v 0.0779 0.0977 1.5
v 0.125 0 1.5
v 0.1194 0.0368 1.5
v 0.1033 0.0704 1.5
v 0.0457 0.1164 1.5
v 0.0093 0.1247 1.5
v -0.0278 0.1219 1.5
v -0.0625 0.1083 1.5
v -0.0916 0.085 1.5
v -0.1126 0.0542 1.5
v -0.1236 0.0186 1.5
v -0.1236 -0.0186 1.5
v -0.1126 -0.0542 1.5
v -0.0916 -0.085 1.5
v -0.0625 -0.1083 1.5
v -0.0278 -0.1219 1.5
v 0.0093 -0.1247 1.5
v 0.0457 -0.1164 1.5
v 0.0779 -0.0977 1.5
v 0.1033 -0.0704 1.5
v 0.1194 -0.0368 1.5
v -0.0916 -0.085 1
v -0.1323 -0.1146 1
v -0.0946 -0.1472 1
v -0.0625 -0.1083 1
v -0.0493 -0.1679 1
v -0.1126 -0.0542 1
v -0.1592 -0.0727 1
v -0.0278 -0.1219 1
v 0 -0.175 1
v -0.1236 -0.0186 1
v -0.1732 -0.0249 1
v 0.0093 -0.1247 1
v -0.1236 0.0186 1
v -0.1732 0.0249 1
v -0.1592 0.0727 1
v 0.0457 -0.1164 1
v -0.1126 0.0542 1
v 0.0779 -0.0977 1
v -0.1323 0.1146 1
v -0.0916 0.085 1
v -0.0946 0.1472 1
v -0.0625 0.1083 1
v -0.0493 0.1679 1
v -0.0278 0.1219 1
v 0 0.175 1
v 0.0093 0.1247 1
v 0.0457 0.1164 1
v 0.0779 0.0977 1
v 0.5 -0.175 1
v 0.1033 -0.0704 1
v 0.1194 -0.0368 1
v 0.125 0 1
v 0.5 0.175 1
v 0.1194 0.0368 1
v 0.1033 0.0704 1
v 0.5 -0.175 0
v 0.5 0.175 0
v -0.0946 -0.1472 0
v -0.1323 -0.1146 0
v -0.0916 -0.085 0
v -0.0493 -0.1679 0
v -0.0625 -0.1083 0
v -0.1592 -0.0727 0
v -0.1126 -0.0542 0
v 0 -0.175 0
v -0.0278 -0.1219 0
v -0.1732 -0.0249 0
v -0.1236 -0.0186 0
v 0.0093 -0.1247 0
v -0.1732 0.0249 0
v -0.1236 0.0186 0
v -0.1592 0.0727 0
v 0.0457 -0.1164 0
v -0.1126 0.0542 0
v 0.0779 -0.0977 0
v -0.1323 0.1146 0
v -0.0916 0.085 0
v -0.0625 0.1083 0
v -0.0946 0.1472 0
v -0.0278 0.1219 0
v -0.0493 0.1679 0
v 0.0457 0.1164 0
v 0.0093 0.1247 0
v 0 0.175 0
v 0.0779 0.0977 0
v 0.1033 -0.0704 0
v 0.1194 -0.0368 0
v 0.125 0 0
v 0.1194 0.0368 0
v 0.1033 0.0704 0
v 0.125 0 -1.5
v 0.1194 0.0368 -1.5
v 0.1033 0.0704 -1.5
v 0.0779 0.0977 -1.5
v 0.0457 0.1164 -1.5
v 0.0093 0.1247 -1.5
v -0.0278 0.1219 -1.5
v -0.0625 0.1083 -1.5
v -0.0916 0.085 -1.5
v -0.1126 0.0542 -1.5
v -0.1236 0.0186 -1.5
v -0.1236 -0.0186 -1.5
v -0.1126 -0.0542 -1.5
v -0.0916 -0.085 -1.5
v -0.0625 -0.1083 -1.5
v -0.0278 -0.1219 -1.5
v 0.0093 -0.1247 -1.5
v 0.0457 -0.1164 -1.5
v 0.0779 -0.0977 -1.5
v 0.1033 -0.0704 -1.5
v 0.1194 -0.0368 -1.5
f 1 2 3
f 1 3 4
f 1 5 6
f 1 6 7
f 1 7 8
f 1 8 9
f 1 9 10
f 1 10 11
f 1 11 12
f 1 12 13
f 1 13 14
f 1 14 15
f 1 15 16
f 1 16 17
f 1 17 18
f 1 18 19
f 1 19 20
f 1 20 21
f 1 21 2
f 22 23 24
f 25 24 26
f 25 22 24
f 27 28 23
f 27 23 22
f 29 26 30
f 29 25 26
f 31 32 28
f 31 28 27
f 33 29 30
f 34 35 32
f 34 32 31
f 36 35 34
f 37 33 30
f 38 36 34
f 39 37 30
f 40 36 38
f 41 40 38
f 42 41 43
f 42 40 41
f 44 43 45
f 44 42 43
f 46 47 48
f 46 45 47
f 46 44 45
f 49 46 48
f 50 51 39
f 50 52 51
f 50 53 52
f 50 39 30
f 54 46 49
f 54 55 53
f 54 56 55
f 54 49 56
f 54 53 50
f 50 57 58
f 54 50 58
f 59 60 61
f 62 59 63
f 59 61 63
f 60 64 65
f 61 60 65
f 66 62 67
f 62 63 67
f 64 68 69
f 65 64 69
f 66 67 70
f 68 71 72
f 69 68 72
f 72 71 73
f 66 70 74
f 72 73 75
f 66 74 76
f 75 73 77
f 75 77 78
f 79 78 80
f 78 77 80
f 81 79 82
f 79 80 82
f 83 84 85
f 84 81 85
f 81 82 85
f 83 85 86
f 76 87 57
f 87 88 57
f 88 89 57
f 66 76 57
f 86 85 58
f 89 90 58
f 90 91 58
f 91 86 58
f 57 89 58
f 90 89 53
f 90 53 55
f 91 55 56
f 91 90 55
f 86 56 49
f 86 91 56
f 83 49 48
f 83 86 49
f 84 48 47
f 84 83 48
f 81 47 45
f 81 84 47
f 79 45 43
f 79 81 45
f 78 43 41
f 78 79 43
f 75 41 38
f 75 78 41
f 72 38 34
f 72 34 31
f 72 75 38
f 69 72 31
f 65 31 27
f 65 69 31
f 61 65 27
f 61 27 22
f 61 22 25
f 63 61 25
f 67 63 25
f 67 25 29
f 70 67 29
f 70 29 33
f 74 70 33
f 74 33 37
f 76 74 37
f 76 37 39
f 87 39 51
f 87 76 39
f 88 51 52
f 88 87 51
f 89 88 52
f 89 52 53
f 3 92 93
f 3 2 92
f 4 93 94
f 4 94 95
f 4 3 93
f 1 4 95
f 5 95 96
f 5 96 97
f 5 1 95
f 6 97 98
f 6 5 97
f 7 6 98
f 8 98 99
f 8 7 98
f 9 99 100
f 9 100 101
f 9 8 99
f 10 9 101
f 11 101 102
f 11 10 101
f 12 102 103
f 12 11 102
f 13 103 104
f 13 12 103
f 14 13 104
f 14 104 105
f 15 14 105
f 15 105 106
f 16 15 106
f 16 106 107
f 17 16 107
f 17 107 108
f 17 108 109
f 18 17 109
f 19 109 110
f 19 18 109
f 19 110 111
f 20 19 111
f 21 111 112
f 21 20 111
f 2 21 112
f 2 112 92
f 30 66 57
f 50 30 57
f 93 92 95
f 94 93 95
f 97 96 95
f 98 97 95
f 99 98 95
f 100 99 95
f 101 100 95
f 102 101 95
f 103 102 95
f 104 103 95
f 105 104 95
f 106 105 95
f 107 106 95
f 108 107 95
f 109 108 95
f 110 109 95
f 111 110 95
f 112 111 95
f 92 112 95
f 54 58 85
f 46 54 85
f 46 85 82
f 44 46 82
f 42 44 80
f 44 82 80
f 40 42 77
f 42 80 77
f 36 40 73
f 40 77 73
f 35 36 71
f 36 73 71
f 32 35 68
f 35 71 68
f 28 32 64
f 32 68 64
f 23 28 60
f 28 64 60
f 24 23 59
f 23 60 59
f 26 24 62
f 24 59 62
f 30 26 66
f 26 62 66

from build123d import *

# Parameters (mm, degrees)
F0_R     = 0.125
F1_DEPTH = 1
F2_DEPTH = 1.5


# Not quite as in the source:
# - ends of sketch curves that miss each other by under 0.0002 mm in the source are joined


with BuildPart() as f1:
    # F0 (on Top) → F1 (new body)
    with BuildSketch(Plane.XY):
        with BuildLine():
            Line((0.5, 0.175), (0, 0.175))
            ThreePointArc((0, 0.175), (-0.175, 0), (0, -0.175))
            Line((0, -0.175), (0.5, -0.175))
            Line((0.5, -0.175), (0.5, 0.175))
        make_face()
        Circle(F0_R, mode=Mode.SUBTRACT)
    extrude(amount=F1_DEPTH)


with BuildPart() as f2:
    # F0 (on Top) → F2 (new body, symmetric)
    with BuildSketch(Plane.XY):
        Circle(F0_R)
    extrude(amount=F2_DEPTH, both=True)


solid = Compound([f1.part, f2.part])
